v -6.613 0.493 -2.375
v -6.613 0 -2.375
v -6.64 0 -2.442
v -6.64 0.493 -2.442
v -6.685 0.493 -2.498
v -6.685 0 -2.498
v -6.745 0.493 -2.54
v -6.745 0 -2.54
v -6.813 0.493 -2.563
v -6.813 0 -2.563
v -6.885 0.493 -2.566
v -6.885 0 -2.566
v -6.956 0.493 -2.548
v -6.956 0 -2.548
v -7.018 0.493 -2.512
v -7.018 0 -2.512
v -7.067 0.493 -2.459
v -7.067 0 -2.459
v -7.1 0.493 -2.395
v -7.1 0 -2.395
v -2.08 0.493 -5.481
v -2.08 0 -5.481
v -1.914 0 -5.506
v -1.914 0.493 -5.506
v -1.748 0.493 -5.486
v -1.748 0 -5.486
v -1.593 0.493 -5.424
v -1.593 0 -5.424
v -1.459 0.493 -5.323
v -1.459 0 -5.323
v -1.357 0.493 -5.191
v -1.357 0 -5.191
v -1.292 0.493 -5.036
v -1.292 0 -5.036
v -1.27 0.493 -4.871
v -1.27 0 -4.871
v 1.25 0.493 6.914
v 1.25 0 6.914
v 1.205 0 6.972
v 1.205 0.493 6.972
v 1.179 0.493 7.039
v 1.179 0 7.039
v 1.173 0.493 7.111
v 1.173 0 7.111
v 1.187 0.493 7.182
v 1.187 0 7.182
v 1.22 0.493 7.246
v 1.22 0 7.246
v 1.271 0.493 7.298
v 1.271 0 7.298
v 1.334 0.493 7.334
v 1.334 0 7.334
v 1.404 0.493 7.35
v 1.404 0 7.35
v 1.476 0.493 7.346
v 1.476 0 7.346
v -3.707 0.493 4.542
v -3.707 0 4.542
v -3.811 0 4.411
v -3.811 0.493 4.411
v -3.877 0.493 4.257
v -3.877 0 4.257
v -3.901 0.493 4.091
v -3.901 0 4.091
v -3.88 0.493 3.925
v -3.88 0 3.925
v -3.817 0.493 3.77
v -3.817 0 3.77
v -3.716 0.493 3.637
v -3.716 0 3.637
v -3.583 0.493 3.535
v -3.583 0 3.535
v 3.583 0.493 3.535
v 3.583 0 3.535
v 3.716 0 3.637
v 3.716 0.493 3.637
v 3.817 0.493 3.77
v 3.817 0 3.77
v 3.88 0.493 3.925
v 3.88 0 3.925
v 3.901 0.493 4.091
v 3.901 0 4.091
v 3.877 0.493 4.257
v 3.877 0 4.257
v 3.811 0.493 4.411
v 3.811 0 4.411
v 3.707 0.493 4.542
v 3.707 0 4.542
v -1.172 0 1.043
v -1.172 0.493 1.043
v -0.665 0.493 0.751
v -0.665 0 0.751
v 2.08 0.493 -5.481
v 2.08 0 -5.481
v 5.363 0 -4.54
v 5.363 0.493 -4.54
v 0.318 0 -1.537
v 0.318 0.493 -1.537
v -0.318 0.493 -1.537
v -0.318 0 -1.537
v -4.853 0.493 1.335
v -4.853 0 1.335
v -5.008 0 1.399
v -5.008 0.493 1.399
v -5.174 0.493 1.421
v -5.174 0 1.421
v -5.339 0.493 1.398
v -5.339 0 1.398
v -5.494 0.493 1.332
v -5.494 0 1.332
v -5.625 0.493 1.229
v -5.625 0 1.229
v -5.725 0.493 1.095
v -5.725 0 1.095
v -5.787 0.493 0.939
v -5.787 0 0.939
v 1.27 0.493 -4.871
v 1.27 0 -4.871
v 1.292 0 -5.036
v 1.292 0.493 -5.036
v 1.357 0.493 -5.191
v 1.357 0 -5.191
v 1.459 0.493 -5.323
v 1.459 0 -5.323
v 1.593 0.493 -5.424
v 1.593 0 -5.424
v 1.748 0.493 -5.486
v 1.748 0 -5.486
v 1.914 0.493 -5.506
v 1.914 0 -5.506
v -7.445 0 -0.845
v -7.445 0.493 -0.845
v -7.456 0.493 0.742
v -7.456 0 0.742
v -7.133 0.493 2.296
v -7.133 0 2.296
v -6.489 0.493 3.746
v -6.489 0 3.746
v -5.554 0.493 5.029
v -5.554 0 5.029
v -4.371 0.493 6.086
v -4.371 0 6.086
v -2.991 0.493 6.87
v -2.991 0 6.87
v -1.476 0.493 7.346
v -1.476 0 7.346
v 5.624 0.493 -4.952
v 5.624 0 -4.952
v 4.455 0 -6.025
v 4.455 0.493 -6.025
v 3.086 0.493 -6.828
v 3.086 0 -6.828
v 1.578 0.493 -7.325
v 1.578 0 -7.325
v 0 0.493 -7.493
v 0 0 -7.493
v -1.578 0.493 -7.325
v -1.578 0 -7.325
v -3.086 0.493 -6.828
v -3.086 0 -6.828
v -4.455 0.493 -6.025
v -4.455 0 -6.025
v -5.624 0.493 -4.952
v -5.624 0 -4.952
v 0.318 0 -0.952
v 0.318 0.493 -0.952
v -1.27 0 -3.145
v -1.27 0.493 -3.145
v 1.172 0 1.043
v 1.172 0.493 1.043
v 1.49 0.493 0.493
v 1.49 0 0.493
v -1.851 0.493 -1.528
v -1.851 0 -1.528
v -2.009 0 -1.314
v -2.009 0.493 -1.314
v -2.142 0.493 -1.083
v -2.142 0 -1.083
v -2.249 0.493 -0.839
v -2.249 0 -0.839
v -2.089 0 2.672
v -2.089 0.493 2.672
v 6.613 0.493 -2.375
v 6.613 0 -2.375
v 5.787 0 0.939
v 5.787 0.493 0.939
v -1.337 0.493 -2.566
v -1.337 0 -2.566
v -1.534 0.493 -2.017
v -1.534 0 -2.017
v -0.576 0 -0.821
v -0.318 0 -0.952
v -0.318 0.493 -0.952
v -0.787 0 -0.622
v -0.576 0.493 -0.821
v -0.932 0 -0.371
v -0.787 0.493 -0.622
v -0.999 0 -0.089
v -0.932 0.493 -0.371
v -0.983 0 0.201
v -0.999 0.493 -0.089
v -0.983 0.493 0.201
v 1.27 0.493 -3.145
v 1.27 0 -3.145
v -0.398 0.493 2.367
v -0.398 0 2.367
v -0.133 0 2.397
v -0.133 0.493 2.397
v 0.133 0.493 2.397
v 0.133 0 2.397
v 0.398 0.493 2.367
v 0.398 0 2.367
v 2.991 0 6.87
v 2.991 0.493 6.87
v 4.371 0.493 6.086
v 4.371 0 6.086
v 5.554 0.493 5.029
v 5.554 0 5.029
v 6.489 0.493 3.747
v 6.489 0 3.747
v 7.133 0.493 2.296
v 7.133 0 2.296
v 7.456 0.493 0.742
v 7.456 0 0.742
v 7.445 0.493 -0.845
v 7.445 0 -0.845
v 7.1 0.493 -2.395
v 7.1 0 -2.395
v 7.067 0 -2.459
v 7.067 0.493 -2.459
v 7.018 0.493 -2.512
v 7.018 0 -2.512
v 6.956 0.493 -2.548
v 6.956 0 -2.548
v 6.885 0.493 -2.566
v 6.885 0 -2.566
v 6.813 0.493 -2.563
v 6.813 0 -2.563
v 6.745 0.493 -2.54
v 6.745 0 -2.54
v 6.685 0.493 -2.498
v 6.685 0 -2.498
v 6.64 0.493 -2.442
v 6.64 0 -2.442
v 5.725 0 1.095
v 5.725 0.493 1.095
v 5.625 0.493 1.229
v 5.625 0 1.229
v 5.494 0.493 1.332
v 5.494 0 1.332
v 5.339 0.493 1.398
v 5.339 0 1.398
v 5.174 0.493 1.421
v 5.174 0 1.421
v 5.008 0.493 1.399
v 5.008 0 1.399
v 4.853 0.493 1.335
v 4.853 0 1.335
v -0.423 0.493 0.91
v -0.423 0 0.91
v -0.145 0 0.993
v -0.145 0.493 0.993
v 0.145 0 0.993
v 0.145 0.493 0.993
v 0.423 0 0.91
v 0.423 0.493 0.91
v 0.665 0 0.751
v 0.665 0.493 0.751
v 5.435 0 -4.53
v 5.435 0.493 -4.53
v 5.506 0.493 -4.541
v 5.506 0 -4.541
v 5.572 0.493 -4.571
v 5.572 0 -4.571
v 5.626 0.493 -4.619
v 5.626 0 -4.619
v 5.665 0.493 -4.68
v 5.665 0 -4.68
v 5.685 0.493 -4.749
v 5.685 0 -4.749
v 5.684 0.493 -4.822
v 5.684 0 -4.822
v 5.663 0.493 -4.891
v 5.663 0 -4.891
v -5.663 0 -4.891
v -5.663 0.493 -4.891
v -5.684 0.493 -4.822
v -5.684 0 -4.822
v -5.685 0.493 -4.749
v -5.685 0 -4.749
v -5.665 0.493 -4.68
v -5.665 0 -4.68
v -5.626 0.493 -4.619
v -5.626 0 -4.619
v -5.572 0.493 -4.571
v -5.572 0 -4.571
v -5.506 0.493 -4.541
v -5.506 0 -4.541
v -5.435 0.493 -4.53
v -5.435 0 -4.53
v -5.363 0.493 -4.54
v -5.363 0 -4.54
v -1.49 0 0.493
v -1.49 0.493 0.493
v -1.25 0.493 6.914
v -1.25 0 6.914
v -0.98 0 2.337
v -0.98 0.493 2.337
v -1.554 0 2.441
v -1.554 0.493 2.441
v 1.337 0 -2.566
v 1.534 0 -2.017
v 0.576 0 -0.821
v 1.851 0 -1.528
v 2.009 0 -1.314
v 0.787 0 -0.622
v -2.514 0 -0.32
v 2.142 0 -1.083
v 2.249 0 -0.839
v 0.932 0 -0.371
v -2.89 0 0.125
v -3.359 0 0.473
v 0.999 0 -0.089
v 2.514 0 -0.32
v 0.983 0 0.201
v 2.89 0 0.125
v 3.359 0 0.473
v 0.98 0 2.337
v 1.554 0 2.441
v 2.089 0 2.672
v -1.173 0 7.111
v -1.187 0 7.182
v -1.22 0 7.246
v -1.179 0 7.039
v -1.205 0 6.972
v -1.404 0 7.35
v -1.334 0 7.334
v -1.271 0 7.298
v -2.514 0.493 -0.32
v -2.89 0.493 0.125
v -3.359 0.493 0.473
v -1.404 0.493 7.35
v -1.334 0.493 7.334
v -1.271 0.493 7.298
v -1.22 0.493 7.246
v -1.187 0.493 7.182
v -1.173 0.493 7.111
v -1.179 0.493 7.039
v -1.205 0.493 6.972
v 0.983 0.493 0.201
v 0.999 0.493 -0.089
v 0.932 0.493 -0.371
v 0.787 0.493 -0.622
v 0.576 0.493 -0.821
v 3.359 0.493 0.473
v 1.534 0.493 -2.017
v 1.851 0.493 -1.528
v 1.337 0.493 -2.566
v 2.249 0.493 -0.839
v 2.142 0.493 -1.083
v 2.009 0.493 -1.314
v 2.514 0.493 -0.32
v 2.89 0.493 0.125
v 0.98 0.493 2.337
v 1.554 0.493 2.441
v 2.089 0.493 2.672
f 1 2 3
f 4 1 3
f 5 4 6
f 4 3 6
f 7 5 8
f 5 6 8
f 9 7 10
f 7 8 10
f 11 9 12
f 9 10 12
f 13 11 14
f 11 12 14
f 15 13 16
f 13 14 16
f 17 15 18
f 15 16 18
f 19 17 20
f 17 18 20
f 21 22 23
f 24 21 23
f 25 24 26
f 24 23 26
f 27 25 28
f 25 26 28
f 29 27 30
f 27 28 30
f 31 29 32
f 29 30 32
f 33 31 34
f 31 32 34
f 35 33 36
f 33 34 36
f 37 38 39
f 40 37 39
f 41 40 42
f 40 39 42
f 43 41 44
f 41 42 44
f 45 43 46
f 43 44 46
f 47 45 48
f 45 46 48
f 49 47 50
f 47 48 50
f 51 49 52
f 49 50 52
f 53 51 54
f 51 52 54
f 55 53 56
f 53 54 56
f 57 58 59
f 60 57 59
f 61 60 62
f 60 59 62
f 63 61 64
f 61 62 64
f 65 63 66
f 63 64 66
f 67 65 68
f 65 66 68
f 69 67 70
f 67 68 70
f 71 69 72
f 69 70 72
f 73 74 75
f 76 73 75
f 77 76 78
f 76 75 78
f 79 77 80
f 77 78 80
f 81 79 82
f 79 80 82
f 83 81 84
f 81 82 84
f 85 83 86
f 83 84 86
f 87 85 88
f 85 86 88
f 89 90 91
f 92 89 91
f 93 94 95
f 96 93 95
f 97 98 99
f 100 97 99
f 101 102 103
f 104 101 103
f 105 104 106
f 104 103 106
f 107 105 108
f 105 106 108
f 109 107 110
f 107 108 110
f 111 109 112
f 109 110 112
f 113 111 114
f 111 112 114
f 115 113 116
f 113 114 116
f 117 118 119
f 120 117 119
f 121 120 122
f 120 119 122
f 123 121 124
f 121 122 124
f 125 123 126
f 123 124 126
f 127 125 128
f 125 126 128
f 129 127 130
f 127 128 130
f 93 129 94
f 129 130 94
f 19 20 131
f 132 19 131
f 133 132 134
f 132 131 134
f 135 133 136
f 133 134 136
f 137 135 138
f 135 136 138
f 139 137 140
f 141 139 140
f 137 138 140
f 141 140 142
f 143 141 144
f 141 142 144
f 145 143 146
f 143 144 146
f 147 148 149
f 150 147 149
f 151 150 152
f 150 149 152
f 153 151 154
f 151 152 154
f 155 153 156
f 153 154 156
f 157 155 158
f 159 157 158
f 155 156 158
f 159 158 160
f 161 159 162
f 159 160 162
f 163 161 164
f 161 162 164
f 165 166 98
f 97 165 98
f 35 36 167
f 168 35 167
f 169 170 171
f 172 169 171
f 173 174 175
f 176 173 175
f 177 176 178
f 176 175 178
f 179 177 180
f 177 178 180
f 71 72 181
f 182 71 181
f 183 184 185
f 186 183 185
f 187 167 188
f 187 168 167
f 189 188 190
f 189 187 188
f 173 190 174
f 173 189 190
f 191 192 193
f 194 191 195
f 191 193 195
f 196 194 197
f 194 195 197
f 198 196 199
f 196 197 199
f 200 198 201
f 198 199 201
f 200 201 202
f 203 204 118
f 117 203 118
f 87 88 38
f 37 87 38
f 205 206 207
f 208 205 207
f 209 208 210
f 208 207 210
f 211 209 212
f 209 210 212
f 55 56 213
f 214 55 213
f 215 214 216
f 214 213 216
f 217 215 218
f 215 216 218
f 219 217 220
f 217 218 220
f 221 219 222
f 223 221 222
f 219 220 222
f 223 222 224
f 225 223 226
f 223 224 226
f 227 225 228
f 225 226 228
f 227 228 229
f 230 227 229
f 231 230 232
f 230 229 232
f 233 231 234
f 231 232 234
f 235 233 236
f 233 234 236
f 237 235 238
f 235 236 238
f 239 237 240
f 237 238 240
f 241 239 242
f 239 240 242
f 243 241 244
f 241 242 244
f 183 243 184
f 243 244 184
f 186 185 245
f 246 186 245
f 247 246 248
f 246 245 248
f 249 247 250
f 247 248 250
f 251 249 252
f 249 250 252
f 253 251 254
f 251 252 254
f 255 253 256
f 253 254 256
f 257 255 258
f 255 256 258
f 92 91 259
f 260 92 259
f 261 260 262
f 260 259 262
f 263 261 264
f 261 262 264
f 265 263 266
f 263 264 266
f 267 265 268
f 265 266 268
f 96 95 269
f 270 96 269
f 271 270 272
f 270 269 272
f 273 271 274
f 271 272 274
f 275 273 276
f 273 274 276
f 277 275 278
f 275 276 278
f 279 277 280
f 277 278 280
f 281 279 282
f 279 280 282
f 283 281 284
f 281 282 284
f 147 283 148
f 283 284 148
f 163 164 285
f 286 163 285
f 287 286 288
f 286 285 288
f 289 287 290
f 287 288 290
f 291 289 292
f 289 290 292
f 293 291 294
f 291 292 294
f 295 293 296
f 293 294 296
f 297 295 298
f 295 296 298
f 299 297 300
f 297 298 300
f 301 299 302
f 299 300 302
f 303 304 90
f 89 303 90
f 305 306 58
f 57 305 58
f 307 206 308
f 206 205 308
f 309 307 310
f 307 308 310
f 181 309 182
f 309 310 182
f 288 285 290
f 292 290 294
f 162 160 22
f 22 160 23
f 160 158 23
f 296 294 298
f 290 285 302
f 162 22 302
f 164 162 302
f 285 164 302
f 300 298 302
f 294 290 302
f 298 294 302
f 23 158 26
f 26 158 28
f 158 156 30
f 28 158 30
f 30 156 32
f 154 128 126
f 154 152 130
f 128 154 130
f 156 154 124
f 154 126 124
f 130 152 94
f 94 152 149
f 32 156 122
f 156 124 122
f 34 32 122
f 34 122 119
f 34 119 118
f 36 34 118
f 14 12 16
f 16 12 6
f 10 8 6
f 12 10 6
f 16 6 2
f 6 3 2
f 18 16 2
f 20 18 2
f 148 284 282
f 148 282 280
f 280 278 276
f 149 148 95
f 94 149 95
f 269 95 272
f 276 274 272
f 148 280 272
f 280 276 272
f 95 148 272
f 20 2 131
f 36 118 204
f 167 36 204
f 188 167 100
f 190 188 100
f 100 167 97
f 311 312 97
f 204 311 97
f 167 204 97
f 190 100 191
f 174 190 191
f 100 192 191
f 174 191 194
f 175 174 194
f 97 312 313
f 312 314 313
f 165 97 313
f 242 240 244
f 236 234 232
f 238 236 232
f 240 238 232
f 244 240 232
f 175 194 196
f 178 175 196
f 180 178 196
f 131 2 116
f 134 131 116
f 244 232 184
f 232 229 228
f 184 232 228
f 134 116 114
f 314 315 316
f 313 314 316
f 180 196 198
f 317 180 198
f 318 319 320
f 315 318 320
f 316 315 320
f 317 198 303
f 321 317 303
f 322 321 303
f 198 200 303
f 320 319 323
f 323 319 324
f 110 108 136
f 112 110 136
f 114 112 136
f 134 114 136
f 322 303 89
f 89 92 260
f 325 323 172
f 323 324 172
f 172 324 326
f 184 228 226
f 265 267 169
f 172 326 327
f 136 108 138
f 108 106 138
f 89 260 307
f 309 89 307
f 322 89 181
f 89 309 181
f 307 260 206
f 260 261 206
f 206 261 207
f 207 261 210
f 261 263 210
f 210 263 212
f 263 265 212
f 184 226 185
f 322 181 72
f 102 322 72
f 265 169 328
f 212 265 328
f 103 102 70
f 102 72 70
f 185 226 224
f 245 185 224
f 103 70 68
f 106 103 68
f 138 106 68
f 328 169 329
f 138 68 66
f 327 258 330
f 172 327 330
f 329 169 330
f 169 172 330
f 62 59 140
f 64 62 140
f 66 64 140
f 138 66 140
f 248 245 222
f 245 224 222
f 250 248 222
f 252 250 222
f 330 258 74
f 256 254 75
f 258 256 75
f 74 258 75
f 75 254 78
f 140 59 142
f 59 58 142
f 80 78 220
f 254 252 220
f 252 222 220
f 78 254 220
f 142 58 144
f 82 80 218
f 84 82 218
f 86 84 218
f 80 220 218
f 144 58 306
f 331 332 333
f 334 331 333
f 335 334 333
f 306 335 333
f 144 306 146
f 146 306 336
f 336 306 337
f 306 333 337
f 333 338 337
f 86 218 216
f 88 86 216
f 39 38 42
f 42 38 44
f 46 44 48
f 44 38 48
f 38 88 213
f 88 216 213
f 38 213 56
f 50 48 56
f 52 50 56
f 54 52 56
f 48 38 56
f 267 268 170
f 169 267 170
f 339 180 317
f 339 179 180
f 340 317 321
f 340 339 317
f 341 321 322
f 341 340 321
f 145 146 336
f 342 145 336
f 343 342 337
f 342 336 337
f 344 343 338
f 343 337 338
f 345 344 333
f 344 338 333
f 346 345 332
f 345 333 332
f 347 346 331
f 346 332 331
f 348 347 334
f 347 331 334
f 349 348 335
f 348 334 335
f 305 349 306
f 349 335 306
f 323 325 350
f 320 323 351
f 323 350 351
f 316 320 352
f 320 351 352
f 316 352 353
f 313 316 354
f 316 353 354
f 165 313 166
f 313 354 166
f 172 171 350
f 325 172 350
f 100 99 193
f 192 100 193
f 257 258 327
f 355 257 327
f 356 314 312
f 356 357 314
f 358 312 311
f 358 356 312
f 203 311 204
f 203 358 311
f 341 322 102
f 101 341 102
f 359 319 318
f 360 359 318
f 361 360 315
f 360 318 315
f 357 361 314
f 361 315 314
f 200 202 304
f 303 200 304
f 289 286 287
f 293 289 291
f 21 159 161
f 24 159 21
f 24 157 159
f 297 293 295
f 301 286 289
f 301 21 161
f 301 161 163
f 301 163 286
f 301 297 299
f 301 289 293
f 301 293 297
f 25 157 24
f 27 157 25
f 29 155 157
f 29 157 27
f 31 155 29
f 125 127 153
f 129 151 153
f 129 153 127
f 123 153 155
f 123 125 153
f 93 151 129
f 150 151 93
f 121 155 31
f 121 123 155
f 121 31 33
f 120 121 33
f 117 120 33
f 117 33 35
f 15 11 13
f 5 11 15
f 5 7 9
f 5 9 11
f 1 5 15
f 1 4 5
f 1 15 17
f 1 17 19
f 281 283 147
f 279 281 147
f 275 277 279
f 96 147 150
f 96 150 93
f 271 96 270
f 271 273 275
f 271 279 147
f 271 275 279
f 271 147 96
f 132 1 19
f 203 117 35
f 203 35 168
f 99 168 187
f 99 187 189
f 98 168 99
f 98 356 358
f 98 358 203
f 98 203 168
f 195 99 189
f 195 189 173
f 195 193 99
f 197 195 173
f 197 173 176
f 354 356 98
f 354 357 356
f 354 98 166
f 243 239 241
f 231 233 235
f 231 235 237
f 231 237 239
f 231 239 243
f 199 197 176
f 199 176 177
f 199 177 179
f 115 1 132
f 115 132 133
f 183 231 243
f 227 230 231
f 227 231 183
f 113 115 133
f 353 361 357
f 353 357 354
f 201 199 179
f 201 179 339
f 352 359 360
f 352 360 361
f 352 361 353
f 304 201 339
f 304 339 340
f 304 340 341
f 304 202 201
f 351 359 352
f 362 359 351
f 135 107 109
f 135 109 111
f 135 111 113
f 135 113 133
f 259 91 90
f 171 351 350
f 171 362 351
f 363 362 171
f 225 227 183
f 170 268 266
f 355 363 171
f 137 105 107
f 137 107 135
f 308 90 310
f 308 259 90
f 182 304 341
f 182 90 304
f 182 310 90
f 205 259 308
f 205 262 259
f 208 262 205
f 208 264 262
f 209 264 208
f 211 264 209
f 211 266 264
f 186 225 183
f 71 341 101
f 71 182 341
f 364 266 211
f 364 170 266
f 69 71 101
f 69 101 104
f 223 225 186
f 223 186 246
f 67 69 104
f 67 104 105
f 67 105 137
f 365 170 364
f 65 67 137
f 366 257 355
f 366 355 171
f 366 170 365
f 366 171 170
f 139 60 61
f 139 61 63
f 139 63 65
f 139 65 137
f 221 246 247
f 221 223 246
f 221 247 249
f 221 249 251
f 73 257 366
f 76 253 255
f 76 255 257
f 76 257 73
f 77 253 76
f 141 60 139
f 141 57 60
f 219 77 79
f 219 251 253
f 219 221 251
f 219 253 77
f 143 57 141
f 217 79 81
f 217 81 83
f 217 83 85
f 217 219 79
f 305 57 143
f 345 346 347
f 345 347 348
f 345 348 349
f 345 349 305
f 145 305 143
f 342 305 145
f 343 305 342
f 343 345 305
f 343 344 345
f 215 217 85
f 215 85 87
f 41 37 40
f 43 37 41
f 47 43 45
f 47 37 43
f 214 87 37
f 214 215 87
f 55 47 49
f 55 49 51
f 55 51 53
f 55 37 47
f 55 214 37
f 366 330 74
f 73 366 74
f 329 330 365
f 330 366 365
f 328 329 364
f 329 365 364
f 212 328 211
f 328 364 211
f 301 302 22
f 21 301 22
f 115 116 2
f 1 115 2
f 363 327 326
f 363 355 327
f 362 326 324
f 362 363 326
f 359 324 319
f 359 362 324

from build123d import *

# Parameters (mm, degrees)
SKETCH1_R           = 2.4003
BOSS_EXTRUDE1_DEPTH = 0.493268
CIRPATTERN1_COUNT   = 3
SKETCH2_R           = 1.0033
CUT_EXTRUDE3_DEPTH  = 11.608176626
CIRPATTERN2_COUNT   = 3
FILLET1_R           = 2.54


with BuildPart() as part:
    # Sketch1 → Boss-Extrude1 (new body)
    with BuildSketch(Plane(origin=(0, 0, 0), x_dir=(1, 0, 0), z_dir=(0, 1, 0))):
        with BuildLine():
            ThreePointArc((-2.080029721, 5.48099038), (-1.52284746, 5.377722752), (-1.27, 4.870589203))
            Line((-1.27, 4.870589203), (-1.27, 2.036796526))
            ThreePointArc((-1.27, 2.036796526), (0, 2.4003), (1.27, 2.036796526))
            Line((1.27, 2.036796526), (1.27, 4.870589203))
            ThreePointArc((1.27, 4.870589203), (1.52284746, 5.377722752), (2.080029721, 5.48099038))
            Line((2.080029721, 5.48099038), (5.363123917, 4.539578268))
            ThreePointArc((5.363123917, 4.539578268), (5.647788598, 4.647944118), (5.62377215, 4.951589221))
            ThreePointArc((5.62377215, 4.951589221), (0, 7.493), (-5.62377215, 4.951589221))
            ThreePointArc((-5.62377215, 4.951589221), (-5.647788598, 4.647944118), (-5.363123917, 4.539578268))
            Line((-5.363123917, 4.539578268), (-2.080029721, 5.48099038))
        make_face()
        Circle(SKETCH1_R)
    boss_extrude1 = extrude(amount=BOSS_EXTRUDE1_DEPTH)

    # CirPattern1: Boss-Extrude1 ×3 about axis
    cirpattern1_axis = Axis((0, 0, 0), (0, 1, 0))
    for i in range(1, CIRPATTERN1_COUNT):
        add(boss_extrude1.rotate(cirpattern1_axis, i * 360 / CIRPATTERN1_COUNT))

    # Sketch2 → Cut-Extrude3 (cut, through all)
    with BuildSketch(Plane(origin=(0, 0.493268, 0), x_dir=(1, 0, 0), z_dir=(0, 1, 0))):
        Circle(SKETCH2_R)
        with BuildLine():
            Line((0.3175, 0.951737695), (0.3175, 1.5367))
            Line((0.3175, 1.5367), (-0.3175, 1.5367))
            Line((-0.3175, 1.5367), (-0.3175, 0.951737695))
            ThreePointArc((-0.3175, 0.951737695), (0, 1.0033), (0.3175, 0.951737695))
        make_face()
    cut_extrude3 = extrude(amount=-CUT_EXTRUDE3_DEPTH, mode=Mode.SUBTRACT)

    # CirPattern2: Cut-Extrude3 ×3 about axis
    cirpattern2_axis = Axis((0, 0, 0), (0, 1, 0))
    for i in range(1, CIRPATTERN2_COUNT):
        add(cut_extrude3.rotate(cirpattern2_axis, i * 360 / CIRPATTERN2_COUNT), mode=Mode.SUBTRACT)

    # Fillet1
    fillet1_edges = [part.edges().sort_by_distance(p)[0] for p in [
        (1.27, 0.246634, -2.036796526),
        (-1.27, 0.246634, -2.036796526),
        (2.398917534, 0.246634, -0.081454),
        (-1.128917534, 0.246634, 2.118250526),
        (-2.398917534, 0.246634, -0.081454),
        (1.128917534, 0.246634, 2.118250526),
    ]]
    fillet(fillet1_edges, radius=FILLET1_R)


solid = part.part
